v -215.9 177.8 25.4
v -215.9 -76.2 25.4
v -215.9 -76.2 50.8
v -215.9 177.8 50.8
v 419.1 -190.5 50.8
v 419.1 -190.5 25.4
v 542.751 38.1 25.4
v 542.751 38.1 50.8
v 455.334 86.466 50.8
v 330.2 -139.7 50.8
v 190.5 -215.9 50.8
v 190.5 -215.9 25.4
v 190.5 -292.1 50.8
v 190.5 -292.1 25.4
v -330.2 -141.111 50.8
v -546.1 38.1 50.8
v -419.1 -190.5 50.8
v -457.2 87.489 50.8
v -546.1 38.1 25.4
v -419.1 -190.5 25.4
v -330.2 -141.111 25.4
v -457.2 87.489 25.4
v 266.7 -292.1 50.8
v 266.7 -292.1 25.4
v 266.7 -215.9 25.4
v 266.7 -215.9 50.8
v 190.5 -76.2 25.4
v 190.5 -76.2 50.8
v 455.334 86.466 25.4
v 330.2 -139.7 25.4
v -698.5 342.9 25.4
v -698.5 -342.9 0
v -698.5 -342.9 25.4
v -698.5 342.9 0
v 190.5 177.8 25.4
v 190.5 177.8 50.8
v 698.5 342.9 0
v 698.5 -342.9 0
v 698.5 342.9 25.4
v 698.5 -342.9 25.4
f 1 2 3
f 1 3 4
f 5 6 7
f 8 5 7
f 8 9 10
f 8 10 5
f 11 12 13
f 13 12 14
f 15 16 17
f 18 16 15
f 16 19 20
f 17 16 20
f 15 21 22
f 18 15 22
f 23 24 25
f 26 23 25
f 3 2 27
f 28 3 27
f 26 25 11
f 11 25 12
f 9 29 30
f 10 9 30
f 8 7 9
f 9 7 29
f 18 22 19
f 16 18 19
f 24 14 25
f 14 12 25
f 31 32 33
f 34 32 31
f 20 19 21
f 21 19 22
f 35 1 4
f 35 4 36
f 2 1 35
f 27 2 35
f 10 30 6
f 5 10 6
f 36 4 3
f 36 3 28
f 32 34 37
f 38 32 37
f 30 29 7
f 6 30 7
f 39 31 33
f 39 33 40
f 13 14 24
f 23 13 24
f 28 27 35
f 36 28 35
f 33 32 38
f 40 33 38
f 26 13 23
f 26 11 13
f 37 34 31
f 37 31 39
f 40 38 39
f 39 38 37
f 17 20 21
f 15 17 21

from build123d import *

# Parameters (mm, degrees)
F0_W     = 1397
F0_H     = 685.8
F1_DEPTH = 25.4
F2_W     = 406.4
F2_H     = 254
F3_DEPTH = 25.4


with BuildPart() as f1:
    # F0 (on Top) → F1 (new body)
    with BuildSketch(Plane.XY):
        Rectangle(F0_W, F0_H)
    extrude(amount=F1_DEPTH)


with BuildPart() as f3:
    # F2 (on face) → F3 (new body)
    with BuildSketch(Plane.XY.offset(25.4)):
        Polygon((-419.1, -190.5), (-330.2, -141.111111), (-457.2, 87.488889), (-546.1, 38.1), align=None)
        Polygon((455.333958, 86.466142), (330.2, -139.7), (419.1, -190.5), (542.750547, 38.1), align=None)
        with Locations((-12.7, 50.8)):
            Rectangle(F2_W, F2_H)
        Polygon((228.6, -254), (190.5, -292.1), (266.7, -292.1), align=None)
        Polygon((190.5, -215.9), (190.5, -292.1), (228.6, -254), align=None)
        Polygon((228.6, -254), (266.7, -292.1), (266.7, -215.9), align=None)
        Polygon((266.7, -215.9), (190.5, -215.9), (228.6, -254), align=None)
    extrude(amount=F3_DEPTH)


solid = Compound([f1.part, f3.part])
